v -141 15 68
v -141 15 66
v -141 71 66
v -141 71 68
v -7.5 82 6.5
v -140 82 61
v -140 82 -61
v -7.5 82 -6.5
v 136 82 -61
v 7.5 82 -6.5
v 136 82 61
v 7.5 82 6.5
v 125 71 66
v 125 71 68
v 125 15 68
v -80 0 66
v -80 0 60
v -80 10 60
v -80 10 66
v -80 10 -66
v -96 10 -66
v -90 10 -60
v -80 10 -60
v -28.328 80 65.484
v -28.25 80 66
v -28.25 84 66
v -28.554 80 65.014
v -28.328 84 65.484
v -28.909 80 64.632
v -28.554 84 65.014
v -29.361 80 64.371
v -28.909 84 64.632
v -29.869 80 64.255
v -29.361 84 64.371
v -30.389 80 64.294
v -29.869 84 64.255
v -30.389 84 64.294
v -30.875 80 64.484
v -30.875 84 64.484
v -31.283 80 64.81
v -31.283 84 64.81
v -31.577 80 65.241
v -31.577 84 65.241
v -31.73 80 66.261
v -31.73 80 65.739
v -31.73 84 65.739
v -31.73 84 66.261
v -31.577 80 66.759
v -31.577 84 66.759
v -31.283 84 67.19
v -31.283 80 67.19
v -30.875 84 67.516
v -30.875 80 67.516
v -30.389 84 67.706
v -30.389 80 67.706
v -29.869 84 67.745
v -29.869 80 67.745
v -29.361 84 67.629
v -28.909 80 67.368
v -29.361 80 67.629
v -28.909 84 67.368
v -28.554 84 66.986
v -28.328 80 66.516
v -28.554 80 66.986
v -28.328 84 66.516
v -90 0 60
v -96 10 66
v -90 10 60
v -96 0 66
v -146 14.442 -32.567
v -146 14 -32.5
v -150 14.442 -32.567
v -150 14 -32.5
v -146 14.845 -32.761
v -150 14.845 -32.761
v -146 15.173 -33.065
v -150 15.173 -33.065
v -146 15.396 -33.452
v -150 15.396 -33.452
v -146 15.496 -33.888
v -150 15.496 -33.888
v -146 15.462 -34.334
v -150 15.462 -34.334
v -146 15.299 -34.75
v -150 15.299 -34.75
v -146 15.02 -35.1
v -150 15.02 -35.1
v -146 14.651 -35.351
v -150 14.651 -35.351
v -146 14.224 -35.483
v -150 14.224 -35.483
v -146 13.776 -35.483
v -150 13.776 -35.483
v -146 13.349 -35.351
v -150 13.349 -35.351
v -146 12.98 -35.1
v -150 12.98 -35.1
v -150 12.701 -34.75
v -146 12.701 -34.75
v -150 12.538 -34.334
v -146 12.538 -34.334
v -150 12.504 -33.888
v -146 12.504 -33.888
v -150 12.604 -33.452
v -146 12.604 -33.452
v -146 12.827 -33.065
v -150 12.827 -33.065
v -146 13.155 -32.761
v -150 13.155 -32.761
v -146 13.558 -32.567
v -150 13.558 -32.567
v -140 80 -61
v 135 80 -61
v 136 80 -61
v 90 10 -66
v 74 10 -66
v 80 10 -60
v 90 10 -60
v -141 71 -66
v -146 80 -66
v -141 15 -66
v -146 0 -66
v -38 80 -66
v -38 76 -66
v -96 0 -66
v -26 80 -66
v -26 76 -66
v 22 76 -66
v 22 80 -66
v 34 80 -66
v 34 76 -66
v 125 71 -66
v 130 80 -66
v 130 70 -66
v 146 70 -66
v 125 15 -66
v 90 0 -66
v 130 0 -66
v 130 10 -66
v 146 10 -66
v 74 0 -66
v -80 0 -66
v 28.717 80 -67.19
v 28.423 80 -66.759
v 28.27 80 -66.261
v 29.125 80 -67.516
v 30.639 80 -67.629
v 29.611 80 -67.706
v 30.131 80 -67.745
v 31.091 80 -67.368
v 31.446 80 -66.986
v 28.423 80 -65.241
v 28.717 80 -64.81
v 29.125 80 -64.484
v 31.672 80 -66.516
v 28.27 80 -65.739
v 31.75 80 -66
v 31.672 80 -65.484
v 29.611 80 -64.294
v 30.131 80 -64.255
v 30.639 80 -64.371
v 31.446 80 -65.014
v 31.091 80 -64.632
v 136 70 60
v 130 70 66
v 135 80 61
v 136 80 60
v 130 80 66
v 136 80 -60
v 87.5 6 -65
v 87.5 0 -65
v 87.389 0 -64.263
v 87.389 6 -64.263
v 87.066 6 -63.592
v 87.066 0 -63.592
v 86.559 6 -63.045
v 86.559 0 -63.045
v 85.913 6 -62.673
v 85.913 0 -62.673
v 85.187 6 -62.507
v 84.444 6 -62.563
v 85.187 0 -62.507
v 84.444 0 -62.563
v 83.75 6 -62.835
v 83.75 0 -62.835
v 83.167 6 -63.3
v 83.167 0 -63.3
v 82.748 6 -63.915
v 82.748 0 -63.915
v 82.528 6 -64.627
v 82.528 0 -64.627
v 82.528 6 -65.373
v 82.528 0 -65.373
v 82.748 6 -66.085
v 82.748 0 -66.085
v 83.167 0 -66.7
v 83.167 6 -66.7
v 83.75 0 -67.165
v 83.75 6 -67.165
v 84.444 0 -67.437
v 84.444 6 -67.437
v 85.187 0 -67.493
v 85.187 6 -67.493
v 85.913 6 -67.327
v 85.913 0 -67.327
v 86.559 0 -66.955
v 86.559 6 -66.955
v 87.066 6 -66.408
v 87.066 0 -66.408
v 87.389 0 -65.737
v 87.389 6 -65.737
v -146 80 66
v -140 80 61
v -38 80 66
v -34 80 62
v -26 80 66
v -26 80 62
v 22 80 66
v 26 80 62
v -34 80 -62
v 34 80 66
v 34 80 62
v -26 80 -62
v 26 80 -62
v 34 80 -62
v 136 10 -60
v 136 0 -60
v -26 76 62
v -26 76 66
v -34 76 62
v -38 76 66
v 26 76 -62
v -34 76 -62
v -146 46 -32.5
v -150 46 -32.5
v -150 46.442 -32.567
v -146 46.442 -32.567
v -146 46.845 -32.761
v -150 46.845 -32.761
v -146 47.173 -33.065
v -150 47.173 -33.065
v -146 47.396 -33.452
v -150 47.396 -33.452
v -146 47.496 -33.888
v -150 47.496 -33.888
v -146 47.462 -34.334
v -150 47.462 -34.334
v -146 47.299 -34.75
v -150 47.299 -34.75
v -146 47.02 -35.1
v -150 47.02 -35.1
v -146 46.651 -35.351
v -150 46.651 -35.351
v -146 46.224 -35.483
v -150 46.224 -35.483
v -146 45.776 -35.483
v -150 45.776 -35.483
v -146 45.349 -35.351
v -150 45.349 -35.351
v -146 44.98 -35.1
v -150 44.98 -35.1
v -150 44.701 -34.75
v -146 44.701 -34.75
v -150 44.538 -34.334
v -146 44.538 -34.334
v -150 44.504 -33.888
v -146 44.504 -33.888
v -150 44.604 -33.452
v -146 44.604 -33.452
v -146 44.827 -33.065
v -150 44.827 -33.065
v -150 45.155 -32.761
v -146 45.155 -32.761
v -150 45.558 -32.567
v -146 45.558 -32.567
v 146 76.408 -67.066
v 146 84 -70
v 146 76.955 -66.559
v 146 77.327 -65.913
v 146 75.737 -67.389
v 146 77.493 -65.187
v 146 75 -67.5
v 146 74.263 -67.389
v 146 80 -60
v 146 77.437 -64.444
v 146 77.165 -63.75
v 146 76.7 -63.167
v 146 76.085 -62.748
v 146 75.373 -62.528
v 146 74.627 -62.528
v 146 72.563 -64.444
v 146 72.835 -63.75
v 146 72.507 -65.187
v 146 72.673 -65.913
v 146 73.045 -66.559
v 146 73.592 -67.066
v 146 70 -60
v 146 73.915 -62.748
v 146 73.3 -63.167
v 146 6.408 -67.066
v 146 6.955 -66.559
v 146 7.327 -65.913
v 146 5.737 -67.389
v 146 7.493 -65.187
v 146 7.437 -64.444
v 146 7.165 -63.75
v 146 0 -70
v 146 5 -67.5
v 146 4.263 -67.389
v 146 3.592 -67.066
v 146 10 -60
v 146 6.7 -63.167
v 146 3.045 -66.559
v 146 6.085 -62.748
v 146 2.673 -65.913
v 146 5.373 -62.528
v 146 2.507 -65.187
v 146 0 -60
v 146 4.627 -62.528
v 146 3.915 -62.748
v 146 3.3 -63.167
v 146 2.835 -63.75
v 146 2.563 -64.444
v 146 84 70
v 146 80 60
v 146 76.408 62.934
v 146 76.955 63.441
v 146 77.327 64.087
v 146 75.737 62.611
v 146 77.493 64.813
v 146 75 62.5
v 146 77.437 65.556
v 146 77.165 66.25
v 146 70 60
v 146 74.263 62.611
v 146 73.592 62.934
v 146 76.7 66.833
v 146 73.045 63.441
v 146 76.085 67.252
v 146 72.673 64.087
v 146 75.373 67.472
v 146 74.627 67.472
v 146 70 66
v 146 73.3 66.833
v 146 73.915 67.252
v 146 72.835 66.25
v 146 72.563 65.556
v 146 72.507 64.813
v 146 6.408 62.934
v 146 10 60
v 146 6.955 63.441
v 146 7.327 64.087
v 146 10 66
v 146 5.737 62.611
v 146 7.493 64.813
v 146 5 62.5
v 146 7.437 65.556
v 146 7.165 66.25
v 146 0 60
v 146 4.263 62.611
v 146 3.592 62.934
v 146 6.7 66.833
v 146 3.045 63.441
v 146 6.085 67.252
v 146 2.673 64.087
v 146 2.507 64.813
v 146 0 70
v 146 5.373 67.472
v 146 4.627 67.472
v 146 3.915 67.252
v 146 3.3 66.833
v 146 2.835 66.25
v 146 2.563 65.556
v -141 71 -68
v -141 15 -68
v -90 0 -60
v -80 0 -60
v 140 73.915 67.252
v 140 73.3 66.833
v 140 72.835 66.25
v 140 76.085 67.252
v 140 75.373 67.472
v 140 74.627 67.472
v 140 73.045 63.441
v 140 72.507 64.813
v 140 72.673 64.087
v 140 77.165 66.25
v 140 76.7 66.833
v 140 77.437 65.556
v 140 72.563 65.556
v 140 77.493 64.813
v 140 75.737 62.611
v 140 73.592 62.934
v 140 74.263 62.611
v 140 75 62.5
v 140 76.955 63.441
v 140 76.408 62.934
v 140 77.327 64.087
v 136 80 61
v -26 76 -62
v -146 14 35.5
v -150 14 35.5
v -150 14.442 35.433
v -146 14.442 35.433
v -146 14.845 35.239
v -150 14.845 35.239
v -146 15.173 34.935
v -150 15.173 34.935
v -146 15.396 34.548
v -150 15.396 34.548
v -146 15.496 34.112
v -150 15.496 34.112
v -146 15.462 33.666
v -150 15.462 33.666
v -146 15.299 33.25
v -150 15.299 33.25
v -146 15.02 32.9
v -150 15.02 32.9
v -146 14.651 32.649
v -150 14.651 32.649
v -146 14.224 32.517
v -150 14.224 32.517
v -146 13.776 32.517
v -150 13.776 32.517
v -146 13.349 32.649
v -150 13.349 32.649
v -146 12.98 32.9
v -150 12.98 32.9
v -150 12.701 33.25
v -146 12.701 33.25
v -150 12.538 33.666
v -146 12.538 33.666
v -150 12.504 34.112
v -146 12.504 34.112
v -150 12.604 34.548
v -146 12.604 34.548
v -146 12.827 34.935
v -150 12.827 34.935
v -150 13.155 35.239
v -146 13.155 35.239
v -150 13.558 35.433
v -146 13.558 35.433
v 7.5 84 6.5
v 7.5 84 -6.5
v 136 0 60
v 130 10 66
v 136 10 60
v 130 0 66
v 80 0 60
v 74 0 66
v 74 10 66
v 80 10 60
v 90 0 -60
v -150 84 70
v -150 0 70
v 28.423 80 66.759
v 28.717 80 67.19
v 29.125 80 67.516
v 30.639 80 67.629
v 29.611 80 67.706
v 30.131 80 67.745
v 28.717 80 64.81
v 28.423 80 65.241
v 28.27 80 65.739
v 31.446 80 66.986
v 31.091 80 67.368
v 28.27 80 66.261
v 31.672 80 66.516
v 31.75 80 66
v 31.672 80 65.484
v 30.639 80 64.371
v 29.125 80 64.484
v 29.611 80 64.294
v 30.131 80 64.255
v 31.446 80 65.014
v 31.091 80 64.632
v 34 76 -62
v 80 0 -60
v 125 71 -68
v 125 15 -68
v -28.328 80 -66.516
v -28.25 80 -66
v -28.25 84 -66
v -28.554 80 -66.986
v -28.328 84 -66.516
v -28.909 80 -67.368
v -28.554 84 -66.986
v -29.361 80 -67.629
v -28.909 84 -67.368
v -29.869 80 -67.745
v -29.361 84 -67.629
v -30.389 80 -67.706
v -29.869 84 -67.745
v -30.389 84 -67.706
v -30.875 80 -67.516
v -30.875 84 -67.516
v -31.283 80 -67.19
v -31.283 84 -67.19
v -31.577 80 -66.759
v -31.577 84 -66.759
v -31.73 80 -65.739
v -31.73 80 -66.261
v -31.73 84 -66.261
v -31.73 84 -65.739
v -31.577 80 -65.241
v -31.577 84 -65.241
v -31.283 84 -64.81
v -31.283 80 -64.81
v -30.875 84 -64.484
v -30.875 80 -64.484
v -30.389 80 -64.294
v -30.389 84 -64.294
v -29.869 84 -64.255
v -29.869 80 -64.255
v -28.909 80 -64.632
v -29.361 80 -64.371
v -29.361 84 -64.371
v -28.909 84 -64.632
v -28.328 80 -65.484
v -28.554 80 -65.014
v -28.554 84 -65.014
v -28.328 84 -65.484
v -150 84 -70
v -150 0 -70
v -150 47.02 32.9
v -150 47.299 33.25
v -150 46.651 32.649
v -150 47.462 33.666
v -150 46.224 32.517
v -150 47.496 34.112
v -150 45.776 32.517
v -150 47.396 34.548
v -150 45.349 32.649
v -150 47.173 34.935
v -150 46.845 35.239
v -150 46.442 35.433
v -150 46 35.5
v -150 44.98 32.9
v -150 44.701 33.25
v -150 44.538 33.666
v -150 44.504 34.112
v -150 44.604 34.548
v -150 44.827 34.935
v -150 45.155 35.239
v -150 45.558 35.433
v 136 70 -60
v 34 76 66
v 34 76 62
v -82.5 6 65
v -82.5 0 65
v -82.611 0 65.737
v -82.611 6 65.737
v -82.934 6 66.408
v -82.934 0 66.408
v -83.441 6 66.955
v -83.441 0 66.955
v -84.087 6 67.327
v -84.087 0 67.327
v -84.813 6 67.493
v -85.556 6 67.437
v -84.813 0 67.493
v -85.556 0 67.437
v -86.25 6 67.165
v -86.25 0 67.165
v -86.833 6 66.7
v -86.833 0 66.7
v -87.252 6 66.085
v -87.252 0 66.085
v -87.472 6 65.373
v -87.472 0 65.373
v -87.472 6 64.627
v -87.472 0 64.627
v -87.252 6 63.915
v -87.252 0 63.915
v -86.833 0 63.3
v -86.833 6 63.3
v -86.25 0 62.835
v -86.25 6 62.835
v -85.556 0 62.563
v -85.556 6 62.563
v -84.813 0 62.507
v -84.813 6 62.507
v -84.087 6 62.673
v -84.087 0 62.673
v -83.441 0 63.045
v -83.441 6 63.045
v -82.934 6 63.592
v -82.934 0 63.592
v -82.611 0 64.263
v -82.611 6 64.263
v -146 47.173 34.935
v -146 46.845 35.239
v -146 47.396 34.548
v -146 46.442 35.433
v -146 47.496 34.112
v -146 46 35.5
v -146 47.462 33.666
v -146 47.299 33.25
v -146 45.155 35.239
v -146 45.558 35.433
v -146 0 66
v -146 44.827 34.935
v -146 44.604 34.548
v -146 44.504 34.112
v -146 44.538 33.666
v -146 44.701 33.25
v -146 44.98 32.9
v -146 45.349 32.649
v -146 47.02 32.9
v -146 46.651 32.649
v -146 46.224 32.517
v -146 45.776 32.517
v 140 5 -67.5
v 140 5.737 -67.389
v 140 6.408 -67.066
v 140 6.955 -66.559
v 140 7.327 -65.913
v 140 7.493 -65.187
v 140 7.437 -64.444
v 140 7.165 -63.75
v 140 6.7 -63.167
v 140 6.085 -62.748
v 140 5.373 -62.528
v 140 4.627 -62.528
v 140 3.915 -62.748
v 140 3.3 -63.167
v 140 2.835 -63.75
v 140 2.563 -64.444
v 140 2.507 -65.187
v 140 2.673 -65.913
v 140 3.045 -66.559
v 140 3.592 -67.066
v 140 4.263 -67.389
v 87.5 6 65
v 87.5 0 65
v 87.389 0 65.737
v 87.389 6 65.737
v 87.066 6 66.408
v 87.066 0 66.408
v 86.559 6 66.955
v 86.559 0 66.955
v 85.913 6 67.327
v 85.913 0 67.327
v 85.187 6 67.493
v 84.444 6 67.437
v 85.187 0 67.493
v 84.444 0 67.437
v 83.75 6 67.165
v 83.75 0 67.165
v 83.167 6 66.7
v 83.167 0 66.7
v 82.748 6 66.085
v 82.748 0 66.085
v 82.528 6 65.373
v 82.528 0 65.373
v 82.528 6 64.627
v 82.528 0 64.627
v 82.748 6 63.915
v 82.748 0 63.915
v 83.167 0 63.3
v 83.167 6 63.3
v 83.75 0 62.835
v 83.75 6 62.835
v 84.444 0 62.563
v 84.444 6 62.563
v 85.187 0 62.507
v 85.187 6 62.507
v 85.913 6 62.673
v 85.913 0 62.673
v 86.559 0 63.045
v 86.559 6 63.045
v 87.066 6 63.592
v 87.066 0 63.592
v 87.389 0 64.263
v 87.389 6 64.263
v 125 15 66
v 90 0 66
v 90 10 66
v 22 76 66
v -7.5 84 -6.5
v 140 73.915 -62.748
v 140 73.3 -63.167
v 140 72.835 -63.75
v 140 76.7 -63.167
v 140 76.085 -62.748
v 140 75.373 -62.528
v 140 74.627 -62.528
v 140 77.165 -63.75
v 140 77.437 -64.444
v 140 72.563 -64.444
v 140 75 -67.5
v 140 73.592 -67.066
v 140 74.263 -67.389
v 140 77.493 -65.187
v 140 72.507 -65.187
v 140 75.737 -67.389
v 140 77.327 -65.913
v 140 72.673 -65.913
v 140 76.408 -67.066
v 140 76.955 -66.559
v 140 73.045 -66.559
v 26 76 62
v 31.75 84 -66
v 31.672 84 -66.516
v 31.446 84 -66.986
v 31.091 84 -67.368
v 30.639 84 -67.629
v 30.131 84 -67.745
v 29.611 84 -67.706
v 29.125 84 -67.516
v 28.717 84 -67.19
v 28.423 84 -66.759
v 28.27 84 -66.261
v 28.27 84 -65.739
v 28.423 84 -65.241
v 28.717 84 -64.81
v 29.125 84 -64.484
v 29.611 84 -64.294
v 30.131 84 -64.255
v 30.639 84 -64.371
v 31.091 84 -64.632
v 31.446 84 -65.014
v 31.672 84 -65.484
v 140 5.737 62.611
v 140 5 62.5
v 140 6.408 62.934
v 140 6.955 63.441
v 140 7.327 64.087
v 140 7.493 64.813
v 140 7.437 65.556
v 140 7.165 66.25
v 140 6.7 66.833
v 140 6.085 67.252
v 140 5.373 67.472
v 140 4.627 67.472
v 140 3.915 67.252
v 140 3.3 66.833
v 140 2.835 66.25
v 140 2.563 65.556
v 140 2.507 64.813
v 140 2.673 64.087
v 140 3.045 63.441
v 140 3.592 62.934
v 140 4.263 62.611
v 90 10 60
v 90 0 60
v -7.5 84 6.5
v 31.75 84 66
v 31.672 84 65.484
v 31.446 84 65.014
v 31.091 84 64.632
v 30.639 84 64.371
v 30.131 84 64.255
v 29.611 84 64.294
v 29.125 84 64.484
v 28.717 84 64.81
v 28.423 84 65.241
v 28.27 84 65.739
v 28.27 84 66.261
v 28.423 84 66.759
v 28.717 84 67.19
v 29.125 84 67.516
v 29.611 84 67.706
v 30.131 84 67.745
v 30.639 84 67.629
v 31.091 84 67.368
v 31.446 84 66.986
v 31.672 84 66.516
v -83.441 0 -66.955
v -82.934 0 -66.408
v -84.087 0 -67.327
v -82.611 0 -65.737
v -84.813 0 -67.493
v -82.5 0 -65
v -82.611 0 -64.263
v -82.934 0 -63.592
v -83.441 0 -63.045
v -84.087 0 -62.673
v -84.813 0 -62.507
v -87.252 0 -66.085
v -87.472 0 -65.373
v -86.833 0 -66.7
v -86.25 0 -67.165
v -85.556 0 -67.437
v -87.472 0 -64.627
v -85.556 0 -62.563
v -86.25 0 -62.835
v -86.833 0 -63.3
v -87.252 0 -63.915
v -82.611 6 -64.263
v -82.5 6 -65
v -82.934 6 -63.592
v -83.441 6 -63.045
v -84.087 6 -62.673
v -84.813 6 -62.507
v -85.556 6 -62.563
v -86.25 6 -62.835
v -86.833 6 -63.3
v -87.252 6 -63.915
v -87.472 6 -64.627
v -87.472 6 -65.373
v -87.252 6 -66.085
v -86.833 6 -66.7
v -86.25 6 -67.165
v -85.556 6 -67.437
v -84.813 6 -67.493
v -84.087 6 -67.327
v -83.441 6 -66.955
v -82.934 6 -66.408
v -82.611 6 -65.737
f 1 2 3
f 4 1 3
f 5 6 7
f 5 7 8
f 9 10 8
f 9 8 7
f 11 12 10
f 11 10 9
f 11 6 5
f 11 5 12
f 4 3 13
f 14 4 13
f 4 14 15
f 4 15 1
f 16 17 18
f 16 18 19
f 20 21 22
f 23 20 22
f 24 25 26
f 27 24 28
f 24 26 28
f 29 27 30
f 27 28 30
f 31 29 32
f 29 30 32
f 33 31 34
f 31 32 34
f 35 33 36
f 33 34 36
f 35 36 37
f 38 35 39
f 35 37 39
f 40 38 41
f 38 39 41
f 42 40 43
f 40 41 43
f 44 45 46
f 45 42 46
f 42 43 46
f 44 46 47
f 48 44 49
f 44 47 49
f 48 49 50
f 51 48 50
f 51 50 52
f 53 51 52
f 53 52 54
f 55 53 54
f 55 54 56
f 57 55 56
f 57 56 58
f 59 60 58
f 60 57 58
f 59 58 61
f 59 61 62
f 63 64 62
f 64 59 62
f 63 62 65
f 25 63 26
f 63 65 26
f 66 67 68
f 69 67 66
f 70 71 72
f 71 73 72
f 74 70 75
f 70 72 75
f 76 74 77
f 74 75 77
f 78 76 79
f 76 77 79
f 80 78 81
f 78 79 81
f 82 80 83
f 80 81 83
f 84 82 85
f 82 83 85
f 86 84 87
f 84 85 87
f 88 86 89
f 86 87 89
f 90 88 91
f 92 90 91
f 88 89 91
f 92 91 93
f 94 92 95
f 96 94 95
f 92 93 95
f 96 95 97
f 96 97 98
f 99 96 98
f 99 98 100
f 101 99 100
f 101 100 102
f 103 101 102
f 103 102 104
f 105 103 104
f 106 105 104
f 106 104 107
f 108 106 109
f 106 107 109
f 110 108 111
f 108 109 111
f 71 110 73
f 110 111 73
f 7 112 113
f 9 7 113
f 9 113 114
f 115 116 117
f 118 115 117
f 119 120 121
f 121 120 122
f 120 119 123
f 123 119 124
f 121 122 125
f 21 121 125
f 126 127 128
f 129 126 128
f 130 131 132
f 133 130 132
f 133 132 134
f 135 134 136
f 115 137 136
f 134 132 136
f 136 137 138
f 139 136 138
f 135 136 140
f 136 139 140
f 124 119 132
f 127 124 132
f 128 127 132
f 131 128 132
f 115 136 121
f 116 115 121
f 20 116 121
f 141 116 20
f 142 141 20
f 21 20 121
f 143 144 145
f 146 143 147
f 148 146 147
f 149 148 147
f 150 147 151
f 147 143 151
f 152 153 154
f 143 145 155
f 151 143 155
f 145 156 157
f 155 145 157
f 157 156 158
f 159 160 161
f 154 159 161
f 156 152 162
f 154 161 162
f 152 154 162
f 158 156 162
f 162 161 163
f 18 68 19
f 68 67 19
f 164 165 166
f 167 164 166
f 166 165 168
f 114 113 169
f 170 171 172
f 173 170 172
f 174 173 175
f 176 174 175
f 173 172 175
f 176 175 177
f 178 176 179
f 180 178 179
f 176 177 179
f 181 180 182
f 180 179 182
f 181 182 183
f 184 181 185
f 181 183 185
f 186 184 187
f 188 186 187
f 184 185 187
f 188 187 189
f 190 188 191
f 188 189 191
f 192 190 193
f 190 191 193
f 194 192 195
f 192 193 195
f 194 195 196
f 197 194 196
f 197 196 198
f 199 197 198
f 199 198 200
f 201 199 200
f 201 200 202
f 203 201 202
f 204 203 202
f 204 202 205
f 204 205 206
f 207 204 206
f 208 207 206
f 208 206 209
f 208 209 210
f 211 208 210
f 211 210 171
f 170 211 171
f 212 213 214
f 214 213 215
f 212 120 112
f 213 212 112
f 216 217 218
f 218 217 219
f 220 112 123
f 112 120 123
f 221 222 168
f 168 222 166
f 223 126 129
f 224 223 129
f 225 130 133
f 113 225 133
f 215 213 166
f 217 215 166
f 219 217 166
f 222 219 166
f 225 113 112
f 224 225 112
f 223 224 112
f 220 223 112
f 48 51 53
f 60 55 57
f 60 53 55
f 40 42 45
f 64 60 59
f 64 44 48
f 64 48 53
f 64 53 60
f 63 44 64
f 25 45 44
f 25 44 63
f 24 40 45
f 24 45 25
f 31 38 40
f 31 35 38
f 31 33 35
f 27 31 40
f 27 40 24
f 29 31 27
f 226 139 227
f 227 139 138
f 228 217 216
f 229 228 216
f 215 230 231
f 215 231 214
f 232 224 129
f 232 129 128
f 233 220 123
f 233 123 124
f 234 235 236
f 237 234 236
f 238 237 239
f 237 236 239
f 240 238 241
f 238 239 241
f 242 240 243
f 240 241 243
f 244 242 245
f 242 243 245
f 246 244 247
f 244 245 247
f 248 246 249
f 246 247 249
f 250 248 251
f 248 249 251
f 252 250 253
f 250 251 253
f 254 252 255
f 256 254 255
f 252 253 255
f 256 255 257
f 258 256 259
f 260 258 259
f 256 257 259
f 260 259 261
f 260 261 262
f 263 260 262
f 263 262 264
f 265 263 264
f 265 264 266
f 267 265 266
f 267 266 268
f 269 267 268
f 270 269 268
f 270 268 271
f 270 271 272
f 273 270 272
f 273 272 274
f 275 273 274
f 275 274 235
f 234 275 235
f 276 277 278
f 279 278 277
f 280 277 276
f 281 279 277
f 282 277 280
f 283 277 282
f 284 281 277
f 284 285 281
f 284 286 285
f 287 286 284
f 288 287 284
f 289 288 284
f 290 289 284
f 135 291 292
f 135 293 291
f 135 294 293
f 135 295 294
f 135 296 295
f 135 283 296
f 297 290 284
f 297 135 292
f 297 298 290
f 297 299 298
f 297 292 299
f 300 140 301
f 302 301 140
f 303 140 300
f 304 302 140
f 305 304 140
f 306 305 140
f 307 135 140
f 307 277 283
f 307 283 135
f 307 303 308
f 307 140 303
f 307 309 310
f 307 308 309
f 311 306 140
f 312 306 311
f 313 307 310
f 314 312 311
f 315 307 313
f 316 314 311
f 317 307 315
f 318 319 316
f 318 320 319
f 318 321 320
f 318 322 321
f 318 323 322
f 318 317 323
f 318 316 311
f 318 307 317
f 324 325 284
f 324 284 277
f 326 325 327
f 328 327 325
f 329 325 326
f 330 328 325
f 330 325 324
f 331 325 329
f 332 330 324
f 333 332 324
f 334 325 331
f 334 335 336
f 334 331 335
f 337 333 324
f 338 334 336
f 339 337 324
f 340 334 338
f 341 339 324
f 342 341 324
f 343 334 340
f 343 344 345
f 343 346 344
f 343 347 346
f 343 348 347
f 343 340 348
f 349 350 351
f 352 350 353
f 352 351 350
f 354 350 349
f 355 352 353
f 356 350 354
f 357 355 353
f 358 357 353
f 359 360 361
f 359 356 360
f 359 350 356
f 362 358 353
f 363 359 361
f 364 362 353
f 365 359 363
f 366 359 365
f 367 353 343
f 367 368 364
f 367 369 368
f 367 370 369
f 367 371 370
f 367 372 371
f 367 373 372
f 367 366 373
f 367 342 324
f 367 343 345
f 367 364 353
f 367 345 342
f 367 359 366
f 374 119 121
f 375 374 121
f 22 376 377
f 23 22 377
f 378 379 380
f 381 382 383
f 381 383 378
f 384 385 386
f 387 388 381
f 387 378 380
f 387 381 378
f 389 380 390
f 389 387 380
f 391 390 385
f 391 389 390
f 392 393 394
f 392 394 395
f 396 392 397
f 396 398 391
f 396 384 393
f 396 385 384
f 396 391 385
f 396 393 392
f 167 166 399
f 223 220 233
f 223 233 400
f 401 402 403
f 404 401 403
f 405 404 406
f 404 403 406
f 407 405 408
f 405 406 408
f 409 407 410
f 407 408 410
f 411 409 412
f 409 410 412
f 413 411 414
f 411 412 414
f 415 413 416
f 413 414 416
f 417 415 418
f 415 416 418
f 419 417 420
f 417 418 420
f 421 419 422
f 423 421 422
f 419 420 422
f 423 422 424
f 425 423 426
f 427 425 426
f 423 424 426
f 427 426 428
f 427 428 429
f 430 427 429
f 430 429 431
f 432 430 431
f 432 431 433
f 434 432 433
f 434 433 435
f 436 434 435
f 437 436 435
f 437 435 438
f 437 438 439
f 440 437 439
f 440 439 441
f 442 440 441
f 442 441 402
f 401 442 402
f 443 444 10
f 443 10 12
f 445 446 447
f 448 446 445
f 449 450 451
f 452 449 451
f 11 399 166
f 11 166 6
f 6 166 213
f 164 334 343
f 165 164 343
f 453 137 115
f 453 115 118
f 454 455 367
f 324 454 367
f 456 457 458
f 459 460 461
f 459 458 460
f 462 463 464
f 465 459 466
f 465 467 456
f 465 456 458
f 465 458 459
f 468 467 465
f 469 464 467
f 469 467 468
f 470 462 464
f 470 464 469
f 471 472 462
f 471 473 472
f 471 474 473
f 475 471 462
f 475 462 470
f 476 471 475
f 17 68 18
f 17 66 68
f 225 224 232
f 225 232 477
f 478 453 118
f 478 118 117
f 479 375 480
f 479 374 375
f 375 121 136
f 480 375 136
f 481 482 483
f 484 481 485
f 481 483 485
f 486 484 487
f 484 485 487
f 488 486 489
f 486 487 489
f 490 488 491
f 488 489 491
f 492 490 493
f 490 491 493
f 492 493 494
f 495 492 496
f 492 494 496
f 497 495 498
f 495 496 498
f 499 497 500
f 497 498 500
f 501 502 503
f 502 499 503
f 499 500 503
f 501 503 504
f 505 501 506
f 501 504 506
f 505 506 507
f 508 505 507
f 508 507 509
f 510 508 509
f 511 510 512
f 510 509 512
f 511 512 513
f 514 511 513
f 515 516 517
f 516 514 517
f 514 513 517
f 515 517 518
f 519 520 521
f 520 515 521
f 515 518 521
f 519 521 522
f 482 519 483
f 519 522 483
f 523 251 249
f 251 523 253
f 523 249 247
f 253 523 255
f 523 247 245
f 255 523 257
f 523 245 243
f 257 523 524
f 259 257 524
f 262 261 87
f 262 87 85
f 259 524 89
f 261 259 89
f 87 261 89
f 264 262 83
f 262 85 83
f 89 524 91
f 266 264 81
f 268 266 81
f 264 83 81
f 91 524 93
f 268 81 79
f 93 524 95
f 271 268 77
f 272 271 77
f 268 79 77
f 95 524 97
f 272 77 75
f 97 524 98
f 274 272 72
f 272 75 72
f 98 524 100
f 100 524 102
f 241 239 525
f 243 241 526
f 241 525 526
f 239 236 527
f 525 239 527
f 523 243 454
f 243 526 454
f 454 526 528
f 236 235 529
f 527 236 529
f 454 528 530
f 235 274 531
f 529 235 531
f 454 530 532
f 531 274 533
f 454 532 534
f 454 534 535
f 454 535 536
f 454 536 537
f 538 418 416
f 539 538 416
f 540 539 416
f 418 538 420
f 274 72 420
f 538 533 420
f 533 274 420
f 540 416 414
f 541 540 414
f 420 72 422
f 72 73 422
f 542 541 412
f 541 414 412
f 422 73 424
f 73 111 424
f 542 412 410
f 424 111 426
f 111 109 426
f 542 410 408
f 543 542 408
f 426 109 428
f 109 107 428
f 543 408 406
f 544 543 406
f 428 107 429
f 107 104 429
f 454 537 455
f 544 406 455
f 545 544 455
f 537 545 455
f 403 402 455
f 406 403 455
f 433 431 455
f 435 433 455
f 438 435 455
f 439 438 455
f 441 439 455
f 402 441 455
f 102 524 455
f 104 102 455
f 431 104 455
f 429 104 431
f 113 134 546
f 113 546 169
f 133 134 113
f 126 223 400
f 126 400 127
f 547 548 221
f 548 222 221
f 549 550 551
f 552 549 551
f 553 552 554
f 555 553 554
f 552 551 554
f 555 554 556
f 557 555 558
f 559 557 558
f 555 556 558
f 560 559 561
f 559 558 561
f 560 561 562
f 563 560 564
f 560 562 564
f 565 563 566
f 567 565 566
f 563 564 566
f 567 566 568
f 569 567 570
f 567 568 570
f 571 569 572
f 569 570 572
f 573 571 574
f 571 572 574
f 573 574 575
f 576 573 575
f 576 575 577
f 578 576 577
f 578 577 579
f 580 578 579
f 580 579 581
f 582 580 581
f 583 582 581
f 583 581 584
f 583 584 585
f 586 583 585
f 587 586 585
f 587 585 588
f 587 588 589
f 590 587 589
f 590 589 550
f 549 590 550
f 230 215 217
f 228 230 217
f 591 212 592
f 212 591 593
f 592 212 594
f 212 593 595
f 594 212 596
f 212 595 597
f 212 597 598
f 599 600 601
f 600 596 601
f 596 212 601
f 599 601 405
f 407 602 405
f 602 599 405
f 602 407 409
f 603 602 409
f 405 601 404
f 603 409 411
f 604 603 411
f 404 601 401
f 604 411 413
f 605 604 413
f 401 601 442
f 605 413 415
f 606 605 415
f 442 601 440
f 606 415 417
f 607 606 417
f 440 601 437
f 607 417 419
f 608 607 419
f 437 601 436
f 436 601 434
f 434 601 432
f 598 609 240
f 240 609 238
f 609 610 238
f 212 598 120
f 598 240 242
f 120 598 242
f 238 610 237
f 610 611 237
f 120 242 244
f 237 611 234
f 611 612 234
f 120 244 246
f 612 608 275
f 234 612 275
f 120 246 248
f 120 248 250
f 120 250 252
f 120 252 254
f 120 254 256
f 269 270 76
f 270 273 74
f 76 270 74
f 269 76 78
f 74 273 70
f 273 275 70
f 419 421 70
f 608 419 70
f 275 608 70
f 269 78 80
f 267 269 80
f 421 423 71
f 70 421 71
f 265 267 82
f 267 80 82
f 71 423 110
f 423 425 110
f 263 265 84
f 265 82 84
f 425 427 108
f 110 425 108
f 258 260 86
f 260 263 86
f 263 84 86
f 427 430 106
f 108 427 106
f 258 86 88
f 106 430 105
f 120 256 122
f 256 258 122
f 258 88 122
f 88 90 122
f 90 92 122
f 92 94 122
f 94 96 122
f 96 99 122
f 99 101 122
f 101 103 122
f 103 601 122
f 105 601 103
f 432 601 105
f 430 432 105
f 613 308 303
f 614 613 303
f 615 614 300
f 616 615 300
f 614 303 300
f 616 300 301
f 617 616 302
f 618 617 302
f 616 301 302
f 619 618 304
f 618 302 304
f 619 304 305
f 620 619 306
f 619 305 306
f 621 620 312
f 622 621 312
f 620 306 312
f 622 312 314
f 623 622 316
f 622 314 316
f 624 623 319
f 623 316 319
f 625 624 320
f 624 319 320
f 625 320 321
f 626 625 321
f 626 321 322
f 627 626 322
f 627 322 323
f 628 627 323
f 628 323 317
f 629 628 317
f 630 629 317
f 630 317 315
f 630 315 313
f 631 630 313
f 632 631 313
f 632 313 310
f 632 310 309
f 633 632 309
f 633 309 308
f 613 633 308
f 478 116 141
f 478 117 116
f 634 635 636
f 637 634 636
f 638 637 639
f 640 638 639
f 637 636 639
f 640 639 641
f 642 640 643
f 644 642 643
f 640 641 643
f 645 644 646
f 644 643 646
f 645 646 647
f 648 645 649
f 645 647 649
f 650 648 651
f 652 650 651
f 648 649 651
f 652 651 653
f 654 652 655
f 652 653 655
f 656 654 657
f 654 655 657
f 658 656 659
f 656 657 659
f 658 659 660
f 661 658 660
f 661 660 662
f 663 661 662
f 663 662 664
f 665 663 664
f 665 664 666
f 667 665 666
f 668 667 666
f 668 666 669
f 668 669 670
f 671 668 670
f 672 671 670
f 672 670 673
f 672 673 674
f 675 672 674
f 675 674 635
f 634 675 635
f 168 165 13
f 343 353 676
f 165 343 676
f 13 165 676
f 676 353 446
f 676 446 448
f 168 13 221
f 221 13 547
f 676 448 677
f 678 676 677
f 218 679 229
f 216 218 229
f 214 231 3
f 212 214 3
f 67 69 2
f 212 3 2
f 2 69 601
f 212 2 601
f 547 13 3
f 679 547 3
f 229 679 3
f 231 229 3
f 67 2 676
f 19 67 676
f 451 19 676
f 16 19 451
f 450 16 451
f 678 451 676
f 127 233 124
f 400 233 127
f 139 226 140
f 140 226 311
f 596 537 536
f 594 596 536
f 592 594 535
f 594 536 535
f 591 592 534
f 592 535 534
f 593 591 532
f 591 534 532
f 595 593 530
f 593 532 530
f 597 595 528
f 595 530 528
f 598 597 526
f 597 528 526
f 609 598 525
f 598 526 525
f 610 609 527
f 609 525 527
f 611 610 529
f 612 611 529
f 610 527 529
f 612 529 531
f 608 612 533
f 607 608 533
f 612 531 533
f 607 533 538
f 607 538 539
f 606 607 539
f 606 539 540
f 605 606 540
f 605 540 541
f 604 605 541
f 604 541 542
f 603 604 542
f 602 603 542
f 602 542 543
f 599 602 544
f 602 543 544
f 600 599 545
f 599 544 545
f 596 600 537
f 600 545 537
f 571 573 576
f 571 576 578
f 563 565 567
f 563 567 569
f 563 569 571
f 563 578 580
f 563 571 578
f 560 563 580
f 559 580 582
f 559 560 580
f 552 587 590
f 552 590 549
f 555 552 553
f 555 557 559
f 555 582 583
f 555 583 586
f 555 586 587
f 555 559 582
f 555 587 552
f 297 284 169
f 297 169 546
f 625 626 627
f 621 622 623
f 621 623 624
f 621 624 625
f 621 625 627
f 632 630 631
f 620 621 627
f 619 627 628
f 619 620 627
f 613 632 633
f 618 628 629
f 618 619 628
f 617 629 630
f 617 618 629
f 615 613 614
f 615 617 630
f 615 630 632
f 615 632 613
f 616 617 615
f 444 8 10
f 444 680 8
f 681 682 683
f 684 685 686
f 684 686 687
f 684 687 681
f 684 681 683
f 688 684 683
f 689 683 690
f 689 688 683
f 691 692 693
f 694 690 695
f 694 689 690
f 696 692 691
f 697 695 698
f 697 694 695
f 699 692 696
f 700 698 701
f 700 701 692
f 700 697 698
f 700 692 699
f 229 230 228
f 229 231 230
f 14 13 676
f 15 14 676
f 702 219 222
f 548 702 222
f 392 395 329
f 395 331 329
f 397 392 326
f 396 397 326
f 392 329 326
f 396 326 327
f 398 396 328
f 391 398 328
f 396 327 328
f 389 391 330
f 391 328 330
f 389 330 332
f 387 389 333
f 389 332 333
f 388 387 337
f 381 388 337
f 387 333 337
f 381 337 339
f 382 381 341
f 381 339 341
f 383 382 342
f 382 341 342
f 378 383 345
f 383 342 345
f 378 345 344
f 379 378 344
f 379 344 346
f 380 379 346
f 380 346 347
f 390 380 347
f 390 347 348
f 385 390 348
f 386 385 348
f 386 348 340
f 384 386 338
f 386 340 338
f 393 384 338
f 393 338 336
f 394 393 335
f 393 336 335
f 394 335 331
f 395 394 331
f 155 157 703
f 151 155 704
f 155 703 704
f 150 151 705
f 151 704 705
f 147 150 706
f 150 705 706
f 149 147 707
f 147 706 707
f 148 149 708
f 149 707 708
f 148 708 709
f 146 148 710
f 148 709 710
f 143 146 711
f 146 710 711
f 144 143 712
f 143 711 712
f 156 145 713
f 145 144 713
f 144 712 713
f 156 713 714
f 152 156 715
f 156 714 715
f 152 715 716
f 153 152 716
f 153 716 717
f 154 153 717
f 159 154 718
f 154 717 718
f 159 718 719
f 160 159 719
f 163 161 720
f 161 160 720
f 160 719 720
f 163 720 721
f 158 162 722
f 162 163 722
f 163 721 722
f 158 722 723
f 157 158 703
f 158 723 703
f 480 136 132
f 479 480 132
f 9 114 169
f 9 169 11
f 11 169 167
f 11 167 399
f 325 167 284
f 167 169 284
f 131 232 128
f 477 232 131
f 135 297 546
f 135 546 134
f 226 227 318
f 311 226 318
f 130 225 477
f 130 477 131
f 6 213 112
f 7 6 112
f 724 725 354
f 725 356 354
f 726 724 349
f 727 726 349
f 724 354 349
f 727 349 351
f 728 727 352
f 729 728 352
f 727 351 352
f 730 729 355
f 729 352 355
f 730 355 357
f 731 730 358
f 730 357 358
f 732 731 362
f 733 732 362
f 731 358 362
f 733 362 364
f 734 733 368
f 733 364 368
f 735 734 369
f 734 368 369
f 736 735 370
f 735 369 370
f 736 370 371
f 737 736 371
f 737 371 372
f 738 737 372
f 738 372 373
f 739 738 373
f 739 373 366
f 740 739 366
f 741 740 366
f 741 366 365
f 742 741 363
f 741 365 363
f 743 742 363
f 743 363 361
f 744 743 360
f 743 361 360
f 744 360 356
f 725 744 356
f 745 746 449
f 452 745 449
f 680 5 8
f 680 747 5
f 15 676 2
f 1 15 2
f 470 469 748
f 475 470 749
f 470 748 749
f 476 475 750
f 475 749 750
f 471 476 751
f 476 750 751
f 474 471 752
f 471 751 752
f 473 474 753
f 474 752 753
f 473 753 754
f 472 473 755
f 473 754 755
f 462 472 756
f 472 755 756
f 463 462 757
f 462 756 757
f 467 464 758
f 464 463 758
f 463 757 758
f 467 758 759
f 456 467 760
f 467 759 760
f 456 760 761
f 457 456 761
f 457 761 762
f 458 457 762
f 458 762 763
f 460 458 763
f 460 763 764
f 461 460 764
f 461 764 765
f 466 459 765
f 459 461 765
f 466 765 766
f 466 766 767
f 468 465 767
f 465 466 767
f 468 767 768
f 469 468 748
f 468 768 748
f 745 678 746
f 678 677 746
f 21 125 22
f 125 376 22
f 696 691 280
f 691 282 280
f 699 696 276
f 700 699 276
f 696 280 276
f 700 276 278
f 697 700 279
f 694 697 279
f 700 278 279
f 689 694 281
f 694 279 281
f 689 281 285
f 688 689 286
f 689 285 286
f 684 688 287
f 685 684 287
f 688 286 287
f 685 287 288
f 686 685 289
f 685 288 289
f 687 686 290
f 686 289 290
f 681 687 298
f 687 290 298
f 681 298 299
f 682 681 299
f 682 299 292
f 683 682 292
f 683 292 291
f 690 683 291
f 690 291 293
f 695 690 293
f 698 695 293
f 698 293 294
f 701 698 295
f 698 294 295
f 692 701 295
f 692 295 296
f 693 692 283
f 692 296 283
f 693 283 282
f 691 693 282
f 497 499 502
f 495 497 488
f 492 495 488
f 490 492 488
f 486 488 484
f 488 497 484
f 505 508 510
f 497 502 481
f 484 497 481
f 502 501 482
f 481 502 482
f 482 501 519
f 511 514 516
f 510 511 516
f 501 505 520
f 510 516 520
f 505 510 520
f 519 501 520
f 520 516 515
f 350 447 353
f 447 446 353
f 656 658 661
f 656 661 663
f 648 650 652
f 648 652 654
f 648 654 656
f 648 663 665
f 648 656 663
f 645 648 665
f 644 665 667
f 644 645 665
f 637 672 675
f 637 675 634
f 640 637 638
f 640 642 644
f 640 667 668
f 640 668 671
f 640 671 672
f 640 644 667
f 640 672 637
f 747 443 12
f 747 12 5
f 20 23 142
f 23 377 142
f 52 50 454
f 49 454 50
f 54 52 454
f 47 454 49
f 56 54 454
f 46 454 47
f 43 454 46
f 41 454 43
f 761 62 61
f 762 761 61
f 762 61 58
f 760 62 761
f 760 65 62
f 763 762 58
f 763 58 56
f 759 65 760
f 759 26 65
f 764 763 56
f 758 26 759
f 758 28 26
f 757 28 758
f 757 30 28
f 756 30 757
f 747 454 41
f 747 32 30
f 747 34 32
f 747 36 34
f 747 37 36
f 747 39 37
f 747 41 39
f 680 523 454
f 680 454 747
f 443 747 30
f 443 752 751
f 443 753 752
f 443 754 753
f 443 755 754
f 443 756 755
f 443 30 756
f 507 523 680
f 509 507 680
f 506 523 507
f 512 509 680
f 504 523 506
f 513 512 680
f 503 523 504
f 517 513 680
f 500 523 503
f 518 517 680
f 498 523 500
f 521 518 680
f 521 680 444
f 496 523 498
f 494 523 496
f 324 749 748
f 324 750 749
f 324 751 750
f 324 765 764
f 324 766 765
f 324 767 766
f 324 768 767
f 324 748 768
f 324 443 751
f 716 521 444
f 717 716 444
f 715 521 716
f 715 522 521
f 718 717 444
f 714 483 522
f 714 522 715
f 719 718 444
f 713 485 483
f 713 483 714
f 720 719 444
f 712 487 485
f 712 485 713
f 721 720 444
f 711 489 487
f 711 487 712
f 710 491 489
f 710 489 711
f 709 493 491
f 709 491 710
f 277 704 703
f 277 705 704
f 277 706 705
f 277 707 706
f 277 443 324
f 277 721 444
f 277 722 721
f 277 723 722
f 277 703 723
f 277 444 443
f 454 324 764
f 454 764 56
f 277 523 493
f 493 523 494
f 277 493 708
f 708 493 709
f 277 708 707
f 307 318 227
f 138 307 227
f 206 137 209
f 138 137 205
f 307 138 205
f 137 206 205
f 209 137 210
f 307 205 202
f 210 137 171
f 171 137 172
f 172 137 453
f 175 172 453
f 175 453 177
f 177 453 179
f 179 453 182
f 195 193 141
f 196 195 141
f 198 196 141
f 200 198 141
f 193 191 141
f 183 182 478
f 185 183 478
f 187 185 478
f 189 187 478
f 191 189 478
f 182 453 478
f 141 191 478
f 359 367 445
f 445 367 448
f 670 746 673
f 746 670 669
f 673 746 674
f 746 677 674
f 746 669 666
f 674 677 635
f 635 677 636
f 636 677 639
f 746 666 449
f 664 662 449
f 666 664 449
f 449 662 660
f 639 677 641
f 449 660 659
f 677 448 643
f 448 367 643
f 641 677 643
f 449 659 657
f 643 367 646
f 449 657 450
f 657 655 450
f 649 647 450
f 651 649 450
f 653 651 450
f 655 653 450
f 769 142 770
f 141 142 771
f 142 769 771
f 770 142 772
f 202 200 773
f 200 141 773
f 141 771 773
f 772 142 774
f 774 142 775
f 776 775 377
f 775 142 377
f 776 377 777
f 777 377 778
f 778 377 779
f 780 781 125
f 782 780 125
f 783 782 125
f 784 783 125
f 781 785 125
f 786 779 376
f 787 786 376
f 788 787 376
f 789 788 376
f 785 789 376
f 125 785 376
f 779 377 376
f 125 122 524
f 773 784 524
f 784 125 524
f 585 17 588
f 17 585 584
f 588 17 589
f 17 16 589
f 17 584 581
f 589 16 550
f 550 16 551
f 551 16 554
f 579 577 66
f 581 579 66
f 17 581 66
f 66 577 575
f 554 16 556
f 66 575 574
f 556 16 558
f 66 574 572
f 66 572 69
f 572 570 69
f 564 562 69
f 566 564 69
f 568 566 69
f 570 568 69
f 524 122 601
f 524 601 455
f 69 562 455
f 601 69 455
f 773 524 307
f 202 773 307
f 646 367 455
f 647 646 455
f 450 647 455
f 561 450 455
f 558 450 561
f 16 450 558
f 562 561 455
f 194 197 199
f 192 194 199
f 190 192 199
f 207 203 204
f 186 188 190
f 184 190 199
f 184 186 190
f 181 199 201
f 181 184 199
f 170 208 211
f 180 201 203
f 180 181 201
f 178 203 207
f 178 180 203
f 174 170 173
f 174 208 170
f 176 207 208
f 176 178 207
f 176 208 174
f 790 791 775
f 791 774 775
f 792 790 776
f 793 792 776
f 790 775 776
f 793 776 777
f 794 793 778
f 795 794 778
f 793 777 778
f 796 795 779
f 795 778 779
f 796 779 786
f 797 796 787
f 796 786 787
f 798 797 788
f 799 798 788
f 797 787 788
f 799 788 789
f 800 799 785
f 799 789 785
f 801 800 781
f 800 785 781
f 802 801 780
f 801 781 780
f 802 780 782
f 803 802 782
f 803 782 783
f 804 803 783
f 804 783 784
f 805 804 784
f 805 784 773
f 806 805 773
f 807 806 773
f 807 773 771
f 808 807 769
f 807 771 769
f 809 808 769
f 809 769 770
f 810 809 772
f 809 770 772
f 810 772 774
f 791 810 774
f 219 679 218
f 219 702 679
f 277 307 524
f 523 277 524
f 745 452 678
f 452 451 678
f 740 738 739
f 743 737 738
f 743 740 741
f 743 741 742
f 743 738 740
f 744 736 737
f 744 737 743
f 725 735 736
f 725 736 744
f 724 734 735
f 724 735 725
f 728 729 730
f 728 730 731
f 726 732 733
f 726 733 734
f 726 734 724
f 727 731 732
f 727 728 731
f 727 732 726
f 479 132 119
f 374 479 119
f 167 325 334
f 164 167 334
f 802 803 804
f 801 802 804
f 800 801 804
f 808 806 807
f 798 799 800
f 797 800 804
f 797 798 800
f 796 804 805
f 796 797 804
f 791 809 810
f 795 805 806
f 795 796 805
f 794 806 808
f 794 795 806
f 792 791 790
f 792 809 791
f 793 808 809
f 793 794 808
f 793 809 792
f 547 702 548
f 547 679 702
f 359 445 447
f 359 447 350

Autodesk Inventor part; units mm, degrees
ref_plane "YZ Plane" through (0, 0, 0) normal (1, 0, 0) x (0, 1, 0)
ref_plane "XZ Plane" through (0, 0, 0) normal (0, 1, 0) x (-1, 0, 0)
ref_plane "XY Plane" through (0, 0, 0) normal (0, 0, 1) x (1, 0, 0)
sketch "Sketch1" plane through (0, 0, 0) normal (0, 1, 0) x (-1, 0, 0)
  line L0 (146, -66) -> (-146, -66)
  line L1 (-146, -66) -> (-146, 66) construction
  line L2 (-146, 66) -> (146, 66)
  line L3 (146, 66) -> (146, -66)
  line L4 (146, 0) -> (-146, 0) construction
  line L5 (0, 66) -> (0, -66) construction
  line L6 (150, -70) -> (-146, -70)
  line L7 (-146, 70) -> (150, 70)
  line L8 (150, 70) -> (150, -70)
  line L9 (-146, 66) -> (-146, 70)
  line L10 (-146, -66) -> (-146, -70)
  point P0 (0, 0)
  point P1 (0, 0)
  dimension "d0" = 292
  dimension "d1" = 132
  dimension "d2" = 4
  dimension "d3" = 4
extrude "Extrusion1" add sketch "Sketch1" along normal blind 80
sketch "Sketch2" plane through (0, 0, 0) normal (0, -1, 0) x (1, 0, 0)
  line L0 (146, 66) -> (-146, 66) construction
  line L1 (-146, -66) -> (146, -66) construction
  line L2 (146, 66) -> (146, -66) construction
  line L3 (146, 0) -> (-146, 0) construction
  line L4 (-146, 66) -> (-146, -66) construction
  line L5 (-90, 66) -> (-90, 60)
  line L6 (-90, 60) -> (-80, 60)
  line L7 (-80, 60) -> (-80, 66)
  line L8 (-90, -66) -> (-90, -60)
  line L9 (-90, -60) -> (-80, -60)
  line L10 (-80, -60) -> (-80, -66)
  line L11 (0, 66) -> (0, -66) construction
  line L12 (90, 66) -> (90, 60)
  line L13 (90, 60) -> (80, 60)
  line L14 (80, 60) -> (80, 66)
  line L15 (80, -60) -> (80, -66)
  line L16 (90, -60) -> (80, -60)
  line L17 (90, -66) -> (90, -60)
  line L18 (-90, 66) -> (-80, 66)
  line L19 (-80, -66) -> (-90, -66)
  line L20 (90, -66) -> (80, -66)
  line L21 (80, 66) -> (90, 66)
  point P0 (0, 0)
  dimension "d6" = 6
  dimension "d7" = 56
  dimension "d8" = 10
extrude "Extrusion2" add sketch "Sketch2" against normal blind 10
sketch "Sketch3" plane through (-150, 0, -70) normal (-1, 0, 0) x (0, 0, 1)
  line L0 (136, 10) -> (130, 10) construction
  line L1 (10, 10) -> (4, 10) construction
  line L2 (10, 10) -> (4, 10) construction
  line L3 (130, 10) -> (136, 10) construction
  line L4 (10, 10) -> (130, 10) construction
  line L5 (136, 80) -> (4, 80) construction
  line L6 (70, 80) -> (70, 0) construction
  line L7 (0, 0) -> (140, 0) construction
  line L8 (0, 0) -> (0, 80) construction
  line L9 (0, 14) -> (140, 14) construction
  circle A0 centre (36, 14) radius 1.5
  circle A1 centre (104, 14) radius 1.5
  line L10 (0, 0) -> (0, 80) construction
  line L11 (0, 46) -> (140, 46) construction
  line L12 (140, 0) -> (140, 80) construction
  circle A2 centre (36, 46) radius 1.5
  circle A3 centre (104, 46) radius 1.5
  dimension "d11" = 4
  dimension "d12" = 3
  dimension "d13" = 68
  dimension "d26" = 32
  dimension "d27" = 3
extrude "Extrusion3" cut sketch "Sketch3" against normal blind 10
sketch "Sketch4" plane through (0, 0, 0) normal (0, -1, 0) x (1, 0, 0)
  line L0 (146, 66) -> (-146, 66) projected
  line L1 (146, 66) -> (136, 66)
  line L2 (136, 66) -> (136, 60)
  line L3 (136, 60) -> (146, 60)
  line L4 (146, 60) -> (146, 66)
  line L5 (146, -66) -> (146, -70) construction
  line L6 (146, -66) -> (146, 66) construction
  line L7 (146, 0) -> (-146, 0) construction
  line L8 (-146, 66) -> (-146, -66) construction
  line L9 (146, -66) -> (136, -66)
  line L10 (136, -66) -> (136, -60)
  line L11 (136, -60) -> (146, -60)
  line L12 (146, -60) -> (146, -66)
  point P0 (0, 0)
  dimension "d16" = 10
  dimension "d17" = 6
extrude "Extrusion4" add sketch "Sketch4" against normal blind 10
sketch "Sketch6" plane through (146, 0, 70) normal (1, 0, 0) x (0, 0, -1)
  line L0 (4, 0) -> (4, 80) construction
  line L1 (136, 10) -> (136, 80) construction
  line L2 (4, 80) -> (136, 80) construction
  line L3 (4, 0) -> (10, 0) construction
  line L4 (130, 0) -> (130, 10) construction
  line L5 (10, 0) -> (130, 0) construction
  line L6 (140, 80) -> (0, 80) construction
  line L7 (70, 80) -> (70, 0) construction
  line L8 (4, 80) -> (10, 80)
  line L9 (10, 80) -> (10, 70)
  line L10 (10, 70) -> (4, 70)
  line L11 (4, 70) -> (4, 80)
  line L12 (136, 0) -> (136, 80) construction
  line L13 (136, 80) -> (4, 80) construction
  line L14 (0, 80) -> (140, 80) construction
  line L15 (136, 80) -> (130, 80)
  line L16 (130, 80) -> (130, 70)
  line L17 (130, 70) -> (136, 70)
  line L18 (136, 70) -> (136, 80)
  dimension "d20" = 10
extrude "Extrusion5" add sketch "Sketch6" against normal blind 10
sketch "Sketch7" plane through (146, 0, 70) normal (1, 0, 0) x (0, 0, -1)
  line L0 (0, 80) -> (10, 80) construction
  line L1 (10, 70) -> (4, 70) construction
  line L2 (0, 80) -> (10, 70) construction
  line L3 (10, 80) -> (0, 70) construction
  line L4 (0, 0) -> (0, 80) construction
  line L5 (0, 40) -> (140, 40) construction
  line L6 (140, 0) -> (140, 80) construction
  line L7 (70, 0) -> (70, 80) construction
  line L8 (140, 80) -> (0, 80) construction
  circle A0 centre (5, 75) radius 2.5
  circle A1 centre (135, 75) radius 2.5
  circle A2 centre (5, 5) radius 2.5
  circle A3 centre (135, 5) radius 2.5
  dimension "d23" = 5
extrude "Extrusion6" cut sketch "Sketch7" against normal blind 6
sketch "Sketch8" plane through (0, 80, 0) normal (0, 1, 0) x (1, 0, 0)
  line L0 (146, 70) -> (146, 60) projected
  line L1 (-150, 70) -> (-150, -70) projected
  line L2 (146, 70) -> (-150, 70)
  line L3 (-150, 70) -> (-150, -70)
  line L4 (-150, -70) -> (146, -70)
  line L5 (146, -70) -> (146, 70)
  point P0 (0, 0)
extrude "Extrusion7" add sketch "Sketch8" along normal blind 4
sketch "Sketch11" plane through (0, 0, 0) normal (0, -1, 0) x (1, 0, 0)
  circle A0 centre (85, 65) radius 2.5
  line L0 (-150, 70) -> (146, 70) projected
  line L1 (90, 60) -> (90, 66) projected
  line L2 (80, 66) -> (-80, 66) projected
  line L3 (0, 66) -> (0, -66) construction
  line L4 (-80, -66) -> (80, -66) projected
  circle A1 centre (-85, 65) radius 2.5
  line L5 (146, 60) -> (136, 60) construction
  line L6 (146, 60) -> (146, -60) construction
  line L7 (146, 60) -> (146, -60) construction
  line L8 (146, 0) -> (-146, 0) construction
  line L9 (-146, 66) -> (-146, -66) construction
  circle A2 centre (85, -65) radius 2.5
  circle A3 centre (-85, -65) radius 2.5
  point P0 (0, 0)
  dimension "d39" = 5
  dimension "d40" = 5
  dimension "d41" = 5
extrude "Extrusion8" cut sketch "Sketch11" against normal blind 6
sketch "Sketch12" plane through (-90, 0, 60) normal (-1, 0, 0) x (0, 0, 1)
  line L0 (6, 0) -> (0, 0) projected
  line L1 (6, 10) -> (6, 0) projected
  line L2 (0, 10) -> (6, 10) projected
  line L3 (0, 0) -> (0, 10) projected
  line L4 (-120, 0) -> (-126, 0) projected
  line L5 (-120, 0) -> (-120, 10) projected
  line L6 (-126, 10) -> (-120, 10) projected
  line L7 (-126, 0) -> (-126, 10) projected
  point P0 (-60, 0)
  point P1 (10, 84)
extrude "Extrusion9" add sketch "Sketch12" along normal blind 6
sketch "Sketch13" plane through (80, 0, 60) normal (-1, 0, 0) x (0, 0, 1)
  line L0 (6, 0) -> (0, 0) projected
  line L1 (6, 10) -> (6, 0) projected
  line L2 (0, 10) -> (6, 10) projected
  line L3 (0, 0) -> (0, 10) projected
  line L4 (-120, 0) -> (-126, 0) projected
  line L5 (-120, 0) -> (-120, 10) projected
  line L6 (-126, 10) -> (-120, 10) projected
  line L7 (-126, 0) -> (-126, 10) projected
  point P0 (-60, 0)
extrude "Extrusion10" add sketch "Sketch13" along normal blind 6
sketch "Sketch14" plane through (136, 0, 60) normal (-1, 0, 0) x (0, 0, 1)
  line L0 (6, 0) -> (0, 0) projected
  line L1 (6, 10) -> (6, 0) projected
  line L2 (0, 10) -> (6, 10) projected
  line L3 (0, 0) -> (0, 10) projected
  line L4 (-120, 0) -> (-126, 0) projected
  line L5 (-120, 0) -> (-120, 10) projected
  line L6 (-126, 10) -> (-120, 10) projected
  line L7 (-126, 0) -> (-126, 10) projected
  line L8 (0, 70) -> (6, 70) projected
  line L9 (6, 80) -> (6, 70) projected
  line L10 (6, 80) -> (0, 80) projected
  line L11 (0, 80) -> (0, 70) projected
  line L12 (-120, 70) -> (-120, 80) projected
  line L13 (-120, 80) -> (-126, 80) projected
  line L14 (-126, 70) -> (-126, 80) projected
  line L15 (-126, 70) -> (-120, 70) projected
  point P0 (-60, 0)
extrude "Extrusion11" add sketch "Sketch14" along normal blind 6
chamfer "Chamfer4" distance 6 angle 45 8 edges at (130, 5, 60) (130, 5, -60) (130, 75, -60) (130, 75, 60) (74, 5, 60) (74, 5, -60) (-96, 5, 60) (-96, 5, -60)
sketch "Sketch16" plane through (0, 84, 0) normal (0, 1, 0) x (1, 0, 0)
  line L0 (-30, 66) -> (30, 66) construction
  line L1 (30, 66) -> (30, -66) construction
  line L2 (30, -66) -> (-30, -66) construction
  line L3 (-30, -66) -> (-30, 66) construction
  line L4 (146, 70) -> (-150, 70) construction
  line L5 (-150, -70) -> (146, -70) construction
  line L6 (-2, 70) -> (-2, -70) construction
  line L7 (-150, 70) -> (-150, -70) construction
  line L8 (-150, 0) -> (146, 0) construction
  line L9 (146, -60) -> (146, 60) construction
  line L10 (0, 66) -> (0, -66) construction
  line L11 (-30, 0) -> (30, 0) construction
  circle A0 centre (-30, 66) radius 1.75
  circle A1 centre (30, 66) radius 1.75
  circle A2 centre (-30, -66) radius 1.75
  circle A3 centre (30, -66) radius 1.75
  line L12 (7.5, -6.5) -> (-7.5, -6.5)
  line L13 (-7.5, -6.5) -> (-7.5, 6.5)
  line L14 (-7.5, 6.5) -> (7.5, 6.5)
  line L15 (7.5, 6.5) -> (7.5, -6.5)
  line L16 (7.5, 0) -> (-7.5, 0) construction
  line L17 (0, 6.5) -> (0, -6.5) construction
  point P0 (0, 0)
  point P1 (0, 0)
  dimension "d79" = 60
  dimension "d80" = 132
  dimension "d81" = 4
  dimension "d82" = 3.5
  dimension "d85" = 15
  dimension "d86" = 13
extrude "Extrusion13" cut sketch "Sketch16" against normal blind 4
sketch "Sketch17" plane through (0, 80, 0) normal (0, -1, 0) x (1, 0, 0)
  line L0 (28.25, 66) -> (-28.25, 66) projected
  line L1 (-26, 66) -> (-38, 66)
  line L2 (-38, 66) -> (-38, 62)
  line L3 (-38, 62) -> (-26, 62)
  line L4 (-26, 62) -> (-26, 66)
  line L5 (0, 66) -> (0, -66) construction
  line L6 (-80, -66) -> (74, -66) construction
  line L7 (-146, 66) -> (-146, -66) construction
  line L8 (-146, 0) -> (146, 0) construction
  line L9 (146, 60) -> (146, -60) construction
  arc A0 (-31.75, 66) -> (-28.25, 66) centre (-30, 66) ccw construction
  line L10 (-30, 66) -> (-30, 62) construction
  line L11 (-28.25, 66) -> (28.25, 66)
  line L12 (28.25, -66) -> (-28.25, -66)
  line L13 (-26, -66) -> (-38, -66)
  line L14 (-38, -66) -> (-38, -62)
  line L15 (-38, -62) -> (-26, -62)
  line L16 (-26, -62) -> (-26, -66)
  arc A1 (-28.25, -66) -> (-31.75, -66) centre (-30, -66) ccw construction
  line L17 (-30, -66) -> (-30, -62) construction
  line L18 (-28.25, -66) -> (28.25, -66)
  line L19 (130, 66) -> (31.75, 66) projected
  line L20 (34, 66) -> (22, 66)
  line L21 (22, 66) -> (22, 62)
  line L22 (22, 62) -> (34, 62)
  line L23 (34, 62) -> (34, 66)
  line L24 (31.75, 66) -> (28.25, 66) construction
  line L25 (30, 66) -> (30, 62) construction
  line L26 (34, -66) -> (22, -66)
  line L27 (22, -66) -> (22, -62)
  line L28 (22, -62) -> (34, -62)
  line L29 (34, -62) -> (34, -66)
  line L30 (31.75, -66) -> (28.25, -66) construction
  line L31 (30, -66) -> (30, -62) construction
  point P0 (0, 0)
  point P1 (-28.25, 66)
  point P2 (31.75, 66)
  dimension "d87" = 4
  dimension "d88" = 4
  dimension "d89" = 8
  dimension "d92" = 12
  dimension "d93" = 4
  dimension "d94" = 4
extrude "Extrusion14" add sketch "Sketch17" along normal blind 4
chamfer "Chamfer5" distance 4 angle 45 4 edges at (-38, 78, 62) (22, 78, 62) (-38, 78, -62) (22, 78, -62)
sketch "Sketch18" plane through (0, 80, 0) normal (0, -1, 0) x (1, 0, 0)
  line L0 (-146, 66) -> (-146, -66) construction
  line L1 (130, 66) -> (146, 66) construction
  line L2 (-146, -66) -> (146, -66) construction
  line L3 (146, -66) -> (146, 66) construction
  line L4 (146, 66) -> (-146, 66) construction
  line L5 (-146, 66) -> (-146, -66) construction
  line L6 (136, 61) -> (-140, 61)
  line L7 (-140, 61) -> (-140, -61)
  line L8 (-140, -61) -> (136, -61)
  line L9 (136, -61) -> (136, 61)
  line L10 (146, 60) -> (146, -60) construction
  line L11 (146, 0) -> (-146, 0) construction
  line L12 (22, 66) -> (-26, 66) construction
  line L13 (-2, 66) -> (-2, -66) construction
  line L14 (-26, -66) -> (22, -66) construction
  point P0 (0, 0)
  dimension "d98" = 5
  dimension "d99" = 10
extrude "Extrusion15" cut sketch "Sketch18" against normal blind 2
sketch "Sketch19" plane through (90, 0, 66) normal (0, 0, -1) x (-1, 0, 0)
  line L0 (-35, 15) -> (231, 15)
  line L1 (231, 15) -> (231, 71)
  line L2 (231, 71) -> (-35, 71)
  line L3 (-35, 71) -> (-35, 15)
  line L4 (-40, 10) -> (-40, 0) projected
  line L5 (236, 0) -> (236, 80) projected
  line L6 (170, 10) -> (186, 10) projected
  line L7 (68, 76) -> (56, 76) projected
  point P0 (90, 0)
  dimension "d102" = 5
  dimension "d103" = 5
  dimension "d104" = 5
  dimension "d105" = 5
extrude "Extrusion16" cut sketch "Sketch19" against normal blind 2
sketch "Sketch20" plane through (-80, 0, -66) normal (0, 0, 1) x (1, 0, 0)
  line L0 (-61, 71) -> (-61, 15) projected
  line L1 (205, 71) -> (-61, 71) projected
  line L2 (205, 15) -> (205, 71) projected
  line L3 (-61, 15) -> (205, 15) projected
  point P0 (80, 0)
extrude "Extrusion18" cut sketch "Sketch20" against normal blind 2
properties part number "electronics_case"
